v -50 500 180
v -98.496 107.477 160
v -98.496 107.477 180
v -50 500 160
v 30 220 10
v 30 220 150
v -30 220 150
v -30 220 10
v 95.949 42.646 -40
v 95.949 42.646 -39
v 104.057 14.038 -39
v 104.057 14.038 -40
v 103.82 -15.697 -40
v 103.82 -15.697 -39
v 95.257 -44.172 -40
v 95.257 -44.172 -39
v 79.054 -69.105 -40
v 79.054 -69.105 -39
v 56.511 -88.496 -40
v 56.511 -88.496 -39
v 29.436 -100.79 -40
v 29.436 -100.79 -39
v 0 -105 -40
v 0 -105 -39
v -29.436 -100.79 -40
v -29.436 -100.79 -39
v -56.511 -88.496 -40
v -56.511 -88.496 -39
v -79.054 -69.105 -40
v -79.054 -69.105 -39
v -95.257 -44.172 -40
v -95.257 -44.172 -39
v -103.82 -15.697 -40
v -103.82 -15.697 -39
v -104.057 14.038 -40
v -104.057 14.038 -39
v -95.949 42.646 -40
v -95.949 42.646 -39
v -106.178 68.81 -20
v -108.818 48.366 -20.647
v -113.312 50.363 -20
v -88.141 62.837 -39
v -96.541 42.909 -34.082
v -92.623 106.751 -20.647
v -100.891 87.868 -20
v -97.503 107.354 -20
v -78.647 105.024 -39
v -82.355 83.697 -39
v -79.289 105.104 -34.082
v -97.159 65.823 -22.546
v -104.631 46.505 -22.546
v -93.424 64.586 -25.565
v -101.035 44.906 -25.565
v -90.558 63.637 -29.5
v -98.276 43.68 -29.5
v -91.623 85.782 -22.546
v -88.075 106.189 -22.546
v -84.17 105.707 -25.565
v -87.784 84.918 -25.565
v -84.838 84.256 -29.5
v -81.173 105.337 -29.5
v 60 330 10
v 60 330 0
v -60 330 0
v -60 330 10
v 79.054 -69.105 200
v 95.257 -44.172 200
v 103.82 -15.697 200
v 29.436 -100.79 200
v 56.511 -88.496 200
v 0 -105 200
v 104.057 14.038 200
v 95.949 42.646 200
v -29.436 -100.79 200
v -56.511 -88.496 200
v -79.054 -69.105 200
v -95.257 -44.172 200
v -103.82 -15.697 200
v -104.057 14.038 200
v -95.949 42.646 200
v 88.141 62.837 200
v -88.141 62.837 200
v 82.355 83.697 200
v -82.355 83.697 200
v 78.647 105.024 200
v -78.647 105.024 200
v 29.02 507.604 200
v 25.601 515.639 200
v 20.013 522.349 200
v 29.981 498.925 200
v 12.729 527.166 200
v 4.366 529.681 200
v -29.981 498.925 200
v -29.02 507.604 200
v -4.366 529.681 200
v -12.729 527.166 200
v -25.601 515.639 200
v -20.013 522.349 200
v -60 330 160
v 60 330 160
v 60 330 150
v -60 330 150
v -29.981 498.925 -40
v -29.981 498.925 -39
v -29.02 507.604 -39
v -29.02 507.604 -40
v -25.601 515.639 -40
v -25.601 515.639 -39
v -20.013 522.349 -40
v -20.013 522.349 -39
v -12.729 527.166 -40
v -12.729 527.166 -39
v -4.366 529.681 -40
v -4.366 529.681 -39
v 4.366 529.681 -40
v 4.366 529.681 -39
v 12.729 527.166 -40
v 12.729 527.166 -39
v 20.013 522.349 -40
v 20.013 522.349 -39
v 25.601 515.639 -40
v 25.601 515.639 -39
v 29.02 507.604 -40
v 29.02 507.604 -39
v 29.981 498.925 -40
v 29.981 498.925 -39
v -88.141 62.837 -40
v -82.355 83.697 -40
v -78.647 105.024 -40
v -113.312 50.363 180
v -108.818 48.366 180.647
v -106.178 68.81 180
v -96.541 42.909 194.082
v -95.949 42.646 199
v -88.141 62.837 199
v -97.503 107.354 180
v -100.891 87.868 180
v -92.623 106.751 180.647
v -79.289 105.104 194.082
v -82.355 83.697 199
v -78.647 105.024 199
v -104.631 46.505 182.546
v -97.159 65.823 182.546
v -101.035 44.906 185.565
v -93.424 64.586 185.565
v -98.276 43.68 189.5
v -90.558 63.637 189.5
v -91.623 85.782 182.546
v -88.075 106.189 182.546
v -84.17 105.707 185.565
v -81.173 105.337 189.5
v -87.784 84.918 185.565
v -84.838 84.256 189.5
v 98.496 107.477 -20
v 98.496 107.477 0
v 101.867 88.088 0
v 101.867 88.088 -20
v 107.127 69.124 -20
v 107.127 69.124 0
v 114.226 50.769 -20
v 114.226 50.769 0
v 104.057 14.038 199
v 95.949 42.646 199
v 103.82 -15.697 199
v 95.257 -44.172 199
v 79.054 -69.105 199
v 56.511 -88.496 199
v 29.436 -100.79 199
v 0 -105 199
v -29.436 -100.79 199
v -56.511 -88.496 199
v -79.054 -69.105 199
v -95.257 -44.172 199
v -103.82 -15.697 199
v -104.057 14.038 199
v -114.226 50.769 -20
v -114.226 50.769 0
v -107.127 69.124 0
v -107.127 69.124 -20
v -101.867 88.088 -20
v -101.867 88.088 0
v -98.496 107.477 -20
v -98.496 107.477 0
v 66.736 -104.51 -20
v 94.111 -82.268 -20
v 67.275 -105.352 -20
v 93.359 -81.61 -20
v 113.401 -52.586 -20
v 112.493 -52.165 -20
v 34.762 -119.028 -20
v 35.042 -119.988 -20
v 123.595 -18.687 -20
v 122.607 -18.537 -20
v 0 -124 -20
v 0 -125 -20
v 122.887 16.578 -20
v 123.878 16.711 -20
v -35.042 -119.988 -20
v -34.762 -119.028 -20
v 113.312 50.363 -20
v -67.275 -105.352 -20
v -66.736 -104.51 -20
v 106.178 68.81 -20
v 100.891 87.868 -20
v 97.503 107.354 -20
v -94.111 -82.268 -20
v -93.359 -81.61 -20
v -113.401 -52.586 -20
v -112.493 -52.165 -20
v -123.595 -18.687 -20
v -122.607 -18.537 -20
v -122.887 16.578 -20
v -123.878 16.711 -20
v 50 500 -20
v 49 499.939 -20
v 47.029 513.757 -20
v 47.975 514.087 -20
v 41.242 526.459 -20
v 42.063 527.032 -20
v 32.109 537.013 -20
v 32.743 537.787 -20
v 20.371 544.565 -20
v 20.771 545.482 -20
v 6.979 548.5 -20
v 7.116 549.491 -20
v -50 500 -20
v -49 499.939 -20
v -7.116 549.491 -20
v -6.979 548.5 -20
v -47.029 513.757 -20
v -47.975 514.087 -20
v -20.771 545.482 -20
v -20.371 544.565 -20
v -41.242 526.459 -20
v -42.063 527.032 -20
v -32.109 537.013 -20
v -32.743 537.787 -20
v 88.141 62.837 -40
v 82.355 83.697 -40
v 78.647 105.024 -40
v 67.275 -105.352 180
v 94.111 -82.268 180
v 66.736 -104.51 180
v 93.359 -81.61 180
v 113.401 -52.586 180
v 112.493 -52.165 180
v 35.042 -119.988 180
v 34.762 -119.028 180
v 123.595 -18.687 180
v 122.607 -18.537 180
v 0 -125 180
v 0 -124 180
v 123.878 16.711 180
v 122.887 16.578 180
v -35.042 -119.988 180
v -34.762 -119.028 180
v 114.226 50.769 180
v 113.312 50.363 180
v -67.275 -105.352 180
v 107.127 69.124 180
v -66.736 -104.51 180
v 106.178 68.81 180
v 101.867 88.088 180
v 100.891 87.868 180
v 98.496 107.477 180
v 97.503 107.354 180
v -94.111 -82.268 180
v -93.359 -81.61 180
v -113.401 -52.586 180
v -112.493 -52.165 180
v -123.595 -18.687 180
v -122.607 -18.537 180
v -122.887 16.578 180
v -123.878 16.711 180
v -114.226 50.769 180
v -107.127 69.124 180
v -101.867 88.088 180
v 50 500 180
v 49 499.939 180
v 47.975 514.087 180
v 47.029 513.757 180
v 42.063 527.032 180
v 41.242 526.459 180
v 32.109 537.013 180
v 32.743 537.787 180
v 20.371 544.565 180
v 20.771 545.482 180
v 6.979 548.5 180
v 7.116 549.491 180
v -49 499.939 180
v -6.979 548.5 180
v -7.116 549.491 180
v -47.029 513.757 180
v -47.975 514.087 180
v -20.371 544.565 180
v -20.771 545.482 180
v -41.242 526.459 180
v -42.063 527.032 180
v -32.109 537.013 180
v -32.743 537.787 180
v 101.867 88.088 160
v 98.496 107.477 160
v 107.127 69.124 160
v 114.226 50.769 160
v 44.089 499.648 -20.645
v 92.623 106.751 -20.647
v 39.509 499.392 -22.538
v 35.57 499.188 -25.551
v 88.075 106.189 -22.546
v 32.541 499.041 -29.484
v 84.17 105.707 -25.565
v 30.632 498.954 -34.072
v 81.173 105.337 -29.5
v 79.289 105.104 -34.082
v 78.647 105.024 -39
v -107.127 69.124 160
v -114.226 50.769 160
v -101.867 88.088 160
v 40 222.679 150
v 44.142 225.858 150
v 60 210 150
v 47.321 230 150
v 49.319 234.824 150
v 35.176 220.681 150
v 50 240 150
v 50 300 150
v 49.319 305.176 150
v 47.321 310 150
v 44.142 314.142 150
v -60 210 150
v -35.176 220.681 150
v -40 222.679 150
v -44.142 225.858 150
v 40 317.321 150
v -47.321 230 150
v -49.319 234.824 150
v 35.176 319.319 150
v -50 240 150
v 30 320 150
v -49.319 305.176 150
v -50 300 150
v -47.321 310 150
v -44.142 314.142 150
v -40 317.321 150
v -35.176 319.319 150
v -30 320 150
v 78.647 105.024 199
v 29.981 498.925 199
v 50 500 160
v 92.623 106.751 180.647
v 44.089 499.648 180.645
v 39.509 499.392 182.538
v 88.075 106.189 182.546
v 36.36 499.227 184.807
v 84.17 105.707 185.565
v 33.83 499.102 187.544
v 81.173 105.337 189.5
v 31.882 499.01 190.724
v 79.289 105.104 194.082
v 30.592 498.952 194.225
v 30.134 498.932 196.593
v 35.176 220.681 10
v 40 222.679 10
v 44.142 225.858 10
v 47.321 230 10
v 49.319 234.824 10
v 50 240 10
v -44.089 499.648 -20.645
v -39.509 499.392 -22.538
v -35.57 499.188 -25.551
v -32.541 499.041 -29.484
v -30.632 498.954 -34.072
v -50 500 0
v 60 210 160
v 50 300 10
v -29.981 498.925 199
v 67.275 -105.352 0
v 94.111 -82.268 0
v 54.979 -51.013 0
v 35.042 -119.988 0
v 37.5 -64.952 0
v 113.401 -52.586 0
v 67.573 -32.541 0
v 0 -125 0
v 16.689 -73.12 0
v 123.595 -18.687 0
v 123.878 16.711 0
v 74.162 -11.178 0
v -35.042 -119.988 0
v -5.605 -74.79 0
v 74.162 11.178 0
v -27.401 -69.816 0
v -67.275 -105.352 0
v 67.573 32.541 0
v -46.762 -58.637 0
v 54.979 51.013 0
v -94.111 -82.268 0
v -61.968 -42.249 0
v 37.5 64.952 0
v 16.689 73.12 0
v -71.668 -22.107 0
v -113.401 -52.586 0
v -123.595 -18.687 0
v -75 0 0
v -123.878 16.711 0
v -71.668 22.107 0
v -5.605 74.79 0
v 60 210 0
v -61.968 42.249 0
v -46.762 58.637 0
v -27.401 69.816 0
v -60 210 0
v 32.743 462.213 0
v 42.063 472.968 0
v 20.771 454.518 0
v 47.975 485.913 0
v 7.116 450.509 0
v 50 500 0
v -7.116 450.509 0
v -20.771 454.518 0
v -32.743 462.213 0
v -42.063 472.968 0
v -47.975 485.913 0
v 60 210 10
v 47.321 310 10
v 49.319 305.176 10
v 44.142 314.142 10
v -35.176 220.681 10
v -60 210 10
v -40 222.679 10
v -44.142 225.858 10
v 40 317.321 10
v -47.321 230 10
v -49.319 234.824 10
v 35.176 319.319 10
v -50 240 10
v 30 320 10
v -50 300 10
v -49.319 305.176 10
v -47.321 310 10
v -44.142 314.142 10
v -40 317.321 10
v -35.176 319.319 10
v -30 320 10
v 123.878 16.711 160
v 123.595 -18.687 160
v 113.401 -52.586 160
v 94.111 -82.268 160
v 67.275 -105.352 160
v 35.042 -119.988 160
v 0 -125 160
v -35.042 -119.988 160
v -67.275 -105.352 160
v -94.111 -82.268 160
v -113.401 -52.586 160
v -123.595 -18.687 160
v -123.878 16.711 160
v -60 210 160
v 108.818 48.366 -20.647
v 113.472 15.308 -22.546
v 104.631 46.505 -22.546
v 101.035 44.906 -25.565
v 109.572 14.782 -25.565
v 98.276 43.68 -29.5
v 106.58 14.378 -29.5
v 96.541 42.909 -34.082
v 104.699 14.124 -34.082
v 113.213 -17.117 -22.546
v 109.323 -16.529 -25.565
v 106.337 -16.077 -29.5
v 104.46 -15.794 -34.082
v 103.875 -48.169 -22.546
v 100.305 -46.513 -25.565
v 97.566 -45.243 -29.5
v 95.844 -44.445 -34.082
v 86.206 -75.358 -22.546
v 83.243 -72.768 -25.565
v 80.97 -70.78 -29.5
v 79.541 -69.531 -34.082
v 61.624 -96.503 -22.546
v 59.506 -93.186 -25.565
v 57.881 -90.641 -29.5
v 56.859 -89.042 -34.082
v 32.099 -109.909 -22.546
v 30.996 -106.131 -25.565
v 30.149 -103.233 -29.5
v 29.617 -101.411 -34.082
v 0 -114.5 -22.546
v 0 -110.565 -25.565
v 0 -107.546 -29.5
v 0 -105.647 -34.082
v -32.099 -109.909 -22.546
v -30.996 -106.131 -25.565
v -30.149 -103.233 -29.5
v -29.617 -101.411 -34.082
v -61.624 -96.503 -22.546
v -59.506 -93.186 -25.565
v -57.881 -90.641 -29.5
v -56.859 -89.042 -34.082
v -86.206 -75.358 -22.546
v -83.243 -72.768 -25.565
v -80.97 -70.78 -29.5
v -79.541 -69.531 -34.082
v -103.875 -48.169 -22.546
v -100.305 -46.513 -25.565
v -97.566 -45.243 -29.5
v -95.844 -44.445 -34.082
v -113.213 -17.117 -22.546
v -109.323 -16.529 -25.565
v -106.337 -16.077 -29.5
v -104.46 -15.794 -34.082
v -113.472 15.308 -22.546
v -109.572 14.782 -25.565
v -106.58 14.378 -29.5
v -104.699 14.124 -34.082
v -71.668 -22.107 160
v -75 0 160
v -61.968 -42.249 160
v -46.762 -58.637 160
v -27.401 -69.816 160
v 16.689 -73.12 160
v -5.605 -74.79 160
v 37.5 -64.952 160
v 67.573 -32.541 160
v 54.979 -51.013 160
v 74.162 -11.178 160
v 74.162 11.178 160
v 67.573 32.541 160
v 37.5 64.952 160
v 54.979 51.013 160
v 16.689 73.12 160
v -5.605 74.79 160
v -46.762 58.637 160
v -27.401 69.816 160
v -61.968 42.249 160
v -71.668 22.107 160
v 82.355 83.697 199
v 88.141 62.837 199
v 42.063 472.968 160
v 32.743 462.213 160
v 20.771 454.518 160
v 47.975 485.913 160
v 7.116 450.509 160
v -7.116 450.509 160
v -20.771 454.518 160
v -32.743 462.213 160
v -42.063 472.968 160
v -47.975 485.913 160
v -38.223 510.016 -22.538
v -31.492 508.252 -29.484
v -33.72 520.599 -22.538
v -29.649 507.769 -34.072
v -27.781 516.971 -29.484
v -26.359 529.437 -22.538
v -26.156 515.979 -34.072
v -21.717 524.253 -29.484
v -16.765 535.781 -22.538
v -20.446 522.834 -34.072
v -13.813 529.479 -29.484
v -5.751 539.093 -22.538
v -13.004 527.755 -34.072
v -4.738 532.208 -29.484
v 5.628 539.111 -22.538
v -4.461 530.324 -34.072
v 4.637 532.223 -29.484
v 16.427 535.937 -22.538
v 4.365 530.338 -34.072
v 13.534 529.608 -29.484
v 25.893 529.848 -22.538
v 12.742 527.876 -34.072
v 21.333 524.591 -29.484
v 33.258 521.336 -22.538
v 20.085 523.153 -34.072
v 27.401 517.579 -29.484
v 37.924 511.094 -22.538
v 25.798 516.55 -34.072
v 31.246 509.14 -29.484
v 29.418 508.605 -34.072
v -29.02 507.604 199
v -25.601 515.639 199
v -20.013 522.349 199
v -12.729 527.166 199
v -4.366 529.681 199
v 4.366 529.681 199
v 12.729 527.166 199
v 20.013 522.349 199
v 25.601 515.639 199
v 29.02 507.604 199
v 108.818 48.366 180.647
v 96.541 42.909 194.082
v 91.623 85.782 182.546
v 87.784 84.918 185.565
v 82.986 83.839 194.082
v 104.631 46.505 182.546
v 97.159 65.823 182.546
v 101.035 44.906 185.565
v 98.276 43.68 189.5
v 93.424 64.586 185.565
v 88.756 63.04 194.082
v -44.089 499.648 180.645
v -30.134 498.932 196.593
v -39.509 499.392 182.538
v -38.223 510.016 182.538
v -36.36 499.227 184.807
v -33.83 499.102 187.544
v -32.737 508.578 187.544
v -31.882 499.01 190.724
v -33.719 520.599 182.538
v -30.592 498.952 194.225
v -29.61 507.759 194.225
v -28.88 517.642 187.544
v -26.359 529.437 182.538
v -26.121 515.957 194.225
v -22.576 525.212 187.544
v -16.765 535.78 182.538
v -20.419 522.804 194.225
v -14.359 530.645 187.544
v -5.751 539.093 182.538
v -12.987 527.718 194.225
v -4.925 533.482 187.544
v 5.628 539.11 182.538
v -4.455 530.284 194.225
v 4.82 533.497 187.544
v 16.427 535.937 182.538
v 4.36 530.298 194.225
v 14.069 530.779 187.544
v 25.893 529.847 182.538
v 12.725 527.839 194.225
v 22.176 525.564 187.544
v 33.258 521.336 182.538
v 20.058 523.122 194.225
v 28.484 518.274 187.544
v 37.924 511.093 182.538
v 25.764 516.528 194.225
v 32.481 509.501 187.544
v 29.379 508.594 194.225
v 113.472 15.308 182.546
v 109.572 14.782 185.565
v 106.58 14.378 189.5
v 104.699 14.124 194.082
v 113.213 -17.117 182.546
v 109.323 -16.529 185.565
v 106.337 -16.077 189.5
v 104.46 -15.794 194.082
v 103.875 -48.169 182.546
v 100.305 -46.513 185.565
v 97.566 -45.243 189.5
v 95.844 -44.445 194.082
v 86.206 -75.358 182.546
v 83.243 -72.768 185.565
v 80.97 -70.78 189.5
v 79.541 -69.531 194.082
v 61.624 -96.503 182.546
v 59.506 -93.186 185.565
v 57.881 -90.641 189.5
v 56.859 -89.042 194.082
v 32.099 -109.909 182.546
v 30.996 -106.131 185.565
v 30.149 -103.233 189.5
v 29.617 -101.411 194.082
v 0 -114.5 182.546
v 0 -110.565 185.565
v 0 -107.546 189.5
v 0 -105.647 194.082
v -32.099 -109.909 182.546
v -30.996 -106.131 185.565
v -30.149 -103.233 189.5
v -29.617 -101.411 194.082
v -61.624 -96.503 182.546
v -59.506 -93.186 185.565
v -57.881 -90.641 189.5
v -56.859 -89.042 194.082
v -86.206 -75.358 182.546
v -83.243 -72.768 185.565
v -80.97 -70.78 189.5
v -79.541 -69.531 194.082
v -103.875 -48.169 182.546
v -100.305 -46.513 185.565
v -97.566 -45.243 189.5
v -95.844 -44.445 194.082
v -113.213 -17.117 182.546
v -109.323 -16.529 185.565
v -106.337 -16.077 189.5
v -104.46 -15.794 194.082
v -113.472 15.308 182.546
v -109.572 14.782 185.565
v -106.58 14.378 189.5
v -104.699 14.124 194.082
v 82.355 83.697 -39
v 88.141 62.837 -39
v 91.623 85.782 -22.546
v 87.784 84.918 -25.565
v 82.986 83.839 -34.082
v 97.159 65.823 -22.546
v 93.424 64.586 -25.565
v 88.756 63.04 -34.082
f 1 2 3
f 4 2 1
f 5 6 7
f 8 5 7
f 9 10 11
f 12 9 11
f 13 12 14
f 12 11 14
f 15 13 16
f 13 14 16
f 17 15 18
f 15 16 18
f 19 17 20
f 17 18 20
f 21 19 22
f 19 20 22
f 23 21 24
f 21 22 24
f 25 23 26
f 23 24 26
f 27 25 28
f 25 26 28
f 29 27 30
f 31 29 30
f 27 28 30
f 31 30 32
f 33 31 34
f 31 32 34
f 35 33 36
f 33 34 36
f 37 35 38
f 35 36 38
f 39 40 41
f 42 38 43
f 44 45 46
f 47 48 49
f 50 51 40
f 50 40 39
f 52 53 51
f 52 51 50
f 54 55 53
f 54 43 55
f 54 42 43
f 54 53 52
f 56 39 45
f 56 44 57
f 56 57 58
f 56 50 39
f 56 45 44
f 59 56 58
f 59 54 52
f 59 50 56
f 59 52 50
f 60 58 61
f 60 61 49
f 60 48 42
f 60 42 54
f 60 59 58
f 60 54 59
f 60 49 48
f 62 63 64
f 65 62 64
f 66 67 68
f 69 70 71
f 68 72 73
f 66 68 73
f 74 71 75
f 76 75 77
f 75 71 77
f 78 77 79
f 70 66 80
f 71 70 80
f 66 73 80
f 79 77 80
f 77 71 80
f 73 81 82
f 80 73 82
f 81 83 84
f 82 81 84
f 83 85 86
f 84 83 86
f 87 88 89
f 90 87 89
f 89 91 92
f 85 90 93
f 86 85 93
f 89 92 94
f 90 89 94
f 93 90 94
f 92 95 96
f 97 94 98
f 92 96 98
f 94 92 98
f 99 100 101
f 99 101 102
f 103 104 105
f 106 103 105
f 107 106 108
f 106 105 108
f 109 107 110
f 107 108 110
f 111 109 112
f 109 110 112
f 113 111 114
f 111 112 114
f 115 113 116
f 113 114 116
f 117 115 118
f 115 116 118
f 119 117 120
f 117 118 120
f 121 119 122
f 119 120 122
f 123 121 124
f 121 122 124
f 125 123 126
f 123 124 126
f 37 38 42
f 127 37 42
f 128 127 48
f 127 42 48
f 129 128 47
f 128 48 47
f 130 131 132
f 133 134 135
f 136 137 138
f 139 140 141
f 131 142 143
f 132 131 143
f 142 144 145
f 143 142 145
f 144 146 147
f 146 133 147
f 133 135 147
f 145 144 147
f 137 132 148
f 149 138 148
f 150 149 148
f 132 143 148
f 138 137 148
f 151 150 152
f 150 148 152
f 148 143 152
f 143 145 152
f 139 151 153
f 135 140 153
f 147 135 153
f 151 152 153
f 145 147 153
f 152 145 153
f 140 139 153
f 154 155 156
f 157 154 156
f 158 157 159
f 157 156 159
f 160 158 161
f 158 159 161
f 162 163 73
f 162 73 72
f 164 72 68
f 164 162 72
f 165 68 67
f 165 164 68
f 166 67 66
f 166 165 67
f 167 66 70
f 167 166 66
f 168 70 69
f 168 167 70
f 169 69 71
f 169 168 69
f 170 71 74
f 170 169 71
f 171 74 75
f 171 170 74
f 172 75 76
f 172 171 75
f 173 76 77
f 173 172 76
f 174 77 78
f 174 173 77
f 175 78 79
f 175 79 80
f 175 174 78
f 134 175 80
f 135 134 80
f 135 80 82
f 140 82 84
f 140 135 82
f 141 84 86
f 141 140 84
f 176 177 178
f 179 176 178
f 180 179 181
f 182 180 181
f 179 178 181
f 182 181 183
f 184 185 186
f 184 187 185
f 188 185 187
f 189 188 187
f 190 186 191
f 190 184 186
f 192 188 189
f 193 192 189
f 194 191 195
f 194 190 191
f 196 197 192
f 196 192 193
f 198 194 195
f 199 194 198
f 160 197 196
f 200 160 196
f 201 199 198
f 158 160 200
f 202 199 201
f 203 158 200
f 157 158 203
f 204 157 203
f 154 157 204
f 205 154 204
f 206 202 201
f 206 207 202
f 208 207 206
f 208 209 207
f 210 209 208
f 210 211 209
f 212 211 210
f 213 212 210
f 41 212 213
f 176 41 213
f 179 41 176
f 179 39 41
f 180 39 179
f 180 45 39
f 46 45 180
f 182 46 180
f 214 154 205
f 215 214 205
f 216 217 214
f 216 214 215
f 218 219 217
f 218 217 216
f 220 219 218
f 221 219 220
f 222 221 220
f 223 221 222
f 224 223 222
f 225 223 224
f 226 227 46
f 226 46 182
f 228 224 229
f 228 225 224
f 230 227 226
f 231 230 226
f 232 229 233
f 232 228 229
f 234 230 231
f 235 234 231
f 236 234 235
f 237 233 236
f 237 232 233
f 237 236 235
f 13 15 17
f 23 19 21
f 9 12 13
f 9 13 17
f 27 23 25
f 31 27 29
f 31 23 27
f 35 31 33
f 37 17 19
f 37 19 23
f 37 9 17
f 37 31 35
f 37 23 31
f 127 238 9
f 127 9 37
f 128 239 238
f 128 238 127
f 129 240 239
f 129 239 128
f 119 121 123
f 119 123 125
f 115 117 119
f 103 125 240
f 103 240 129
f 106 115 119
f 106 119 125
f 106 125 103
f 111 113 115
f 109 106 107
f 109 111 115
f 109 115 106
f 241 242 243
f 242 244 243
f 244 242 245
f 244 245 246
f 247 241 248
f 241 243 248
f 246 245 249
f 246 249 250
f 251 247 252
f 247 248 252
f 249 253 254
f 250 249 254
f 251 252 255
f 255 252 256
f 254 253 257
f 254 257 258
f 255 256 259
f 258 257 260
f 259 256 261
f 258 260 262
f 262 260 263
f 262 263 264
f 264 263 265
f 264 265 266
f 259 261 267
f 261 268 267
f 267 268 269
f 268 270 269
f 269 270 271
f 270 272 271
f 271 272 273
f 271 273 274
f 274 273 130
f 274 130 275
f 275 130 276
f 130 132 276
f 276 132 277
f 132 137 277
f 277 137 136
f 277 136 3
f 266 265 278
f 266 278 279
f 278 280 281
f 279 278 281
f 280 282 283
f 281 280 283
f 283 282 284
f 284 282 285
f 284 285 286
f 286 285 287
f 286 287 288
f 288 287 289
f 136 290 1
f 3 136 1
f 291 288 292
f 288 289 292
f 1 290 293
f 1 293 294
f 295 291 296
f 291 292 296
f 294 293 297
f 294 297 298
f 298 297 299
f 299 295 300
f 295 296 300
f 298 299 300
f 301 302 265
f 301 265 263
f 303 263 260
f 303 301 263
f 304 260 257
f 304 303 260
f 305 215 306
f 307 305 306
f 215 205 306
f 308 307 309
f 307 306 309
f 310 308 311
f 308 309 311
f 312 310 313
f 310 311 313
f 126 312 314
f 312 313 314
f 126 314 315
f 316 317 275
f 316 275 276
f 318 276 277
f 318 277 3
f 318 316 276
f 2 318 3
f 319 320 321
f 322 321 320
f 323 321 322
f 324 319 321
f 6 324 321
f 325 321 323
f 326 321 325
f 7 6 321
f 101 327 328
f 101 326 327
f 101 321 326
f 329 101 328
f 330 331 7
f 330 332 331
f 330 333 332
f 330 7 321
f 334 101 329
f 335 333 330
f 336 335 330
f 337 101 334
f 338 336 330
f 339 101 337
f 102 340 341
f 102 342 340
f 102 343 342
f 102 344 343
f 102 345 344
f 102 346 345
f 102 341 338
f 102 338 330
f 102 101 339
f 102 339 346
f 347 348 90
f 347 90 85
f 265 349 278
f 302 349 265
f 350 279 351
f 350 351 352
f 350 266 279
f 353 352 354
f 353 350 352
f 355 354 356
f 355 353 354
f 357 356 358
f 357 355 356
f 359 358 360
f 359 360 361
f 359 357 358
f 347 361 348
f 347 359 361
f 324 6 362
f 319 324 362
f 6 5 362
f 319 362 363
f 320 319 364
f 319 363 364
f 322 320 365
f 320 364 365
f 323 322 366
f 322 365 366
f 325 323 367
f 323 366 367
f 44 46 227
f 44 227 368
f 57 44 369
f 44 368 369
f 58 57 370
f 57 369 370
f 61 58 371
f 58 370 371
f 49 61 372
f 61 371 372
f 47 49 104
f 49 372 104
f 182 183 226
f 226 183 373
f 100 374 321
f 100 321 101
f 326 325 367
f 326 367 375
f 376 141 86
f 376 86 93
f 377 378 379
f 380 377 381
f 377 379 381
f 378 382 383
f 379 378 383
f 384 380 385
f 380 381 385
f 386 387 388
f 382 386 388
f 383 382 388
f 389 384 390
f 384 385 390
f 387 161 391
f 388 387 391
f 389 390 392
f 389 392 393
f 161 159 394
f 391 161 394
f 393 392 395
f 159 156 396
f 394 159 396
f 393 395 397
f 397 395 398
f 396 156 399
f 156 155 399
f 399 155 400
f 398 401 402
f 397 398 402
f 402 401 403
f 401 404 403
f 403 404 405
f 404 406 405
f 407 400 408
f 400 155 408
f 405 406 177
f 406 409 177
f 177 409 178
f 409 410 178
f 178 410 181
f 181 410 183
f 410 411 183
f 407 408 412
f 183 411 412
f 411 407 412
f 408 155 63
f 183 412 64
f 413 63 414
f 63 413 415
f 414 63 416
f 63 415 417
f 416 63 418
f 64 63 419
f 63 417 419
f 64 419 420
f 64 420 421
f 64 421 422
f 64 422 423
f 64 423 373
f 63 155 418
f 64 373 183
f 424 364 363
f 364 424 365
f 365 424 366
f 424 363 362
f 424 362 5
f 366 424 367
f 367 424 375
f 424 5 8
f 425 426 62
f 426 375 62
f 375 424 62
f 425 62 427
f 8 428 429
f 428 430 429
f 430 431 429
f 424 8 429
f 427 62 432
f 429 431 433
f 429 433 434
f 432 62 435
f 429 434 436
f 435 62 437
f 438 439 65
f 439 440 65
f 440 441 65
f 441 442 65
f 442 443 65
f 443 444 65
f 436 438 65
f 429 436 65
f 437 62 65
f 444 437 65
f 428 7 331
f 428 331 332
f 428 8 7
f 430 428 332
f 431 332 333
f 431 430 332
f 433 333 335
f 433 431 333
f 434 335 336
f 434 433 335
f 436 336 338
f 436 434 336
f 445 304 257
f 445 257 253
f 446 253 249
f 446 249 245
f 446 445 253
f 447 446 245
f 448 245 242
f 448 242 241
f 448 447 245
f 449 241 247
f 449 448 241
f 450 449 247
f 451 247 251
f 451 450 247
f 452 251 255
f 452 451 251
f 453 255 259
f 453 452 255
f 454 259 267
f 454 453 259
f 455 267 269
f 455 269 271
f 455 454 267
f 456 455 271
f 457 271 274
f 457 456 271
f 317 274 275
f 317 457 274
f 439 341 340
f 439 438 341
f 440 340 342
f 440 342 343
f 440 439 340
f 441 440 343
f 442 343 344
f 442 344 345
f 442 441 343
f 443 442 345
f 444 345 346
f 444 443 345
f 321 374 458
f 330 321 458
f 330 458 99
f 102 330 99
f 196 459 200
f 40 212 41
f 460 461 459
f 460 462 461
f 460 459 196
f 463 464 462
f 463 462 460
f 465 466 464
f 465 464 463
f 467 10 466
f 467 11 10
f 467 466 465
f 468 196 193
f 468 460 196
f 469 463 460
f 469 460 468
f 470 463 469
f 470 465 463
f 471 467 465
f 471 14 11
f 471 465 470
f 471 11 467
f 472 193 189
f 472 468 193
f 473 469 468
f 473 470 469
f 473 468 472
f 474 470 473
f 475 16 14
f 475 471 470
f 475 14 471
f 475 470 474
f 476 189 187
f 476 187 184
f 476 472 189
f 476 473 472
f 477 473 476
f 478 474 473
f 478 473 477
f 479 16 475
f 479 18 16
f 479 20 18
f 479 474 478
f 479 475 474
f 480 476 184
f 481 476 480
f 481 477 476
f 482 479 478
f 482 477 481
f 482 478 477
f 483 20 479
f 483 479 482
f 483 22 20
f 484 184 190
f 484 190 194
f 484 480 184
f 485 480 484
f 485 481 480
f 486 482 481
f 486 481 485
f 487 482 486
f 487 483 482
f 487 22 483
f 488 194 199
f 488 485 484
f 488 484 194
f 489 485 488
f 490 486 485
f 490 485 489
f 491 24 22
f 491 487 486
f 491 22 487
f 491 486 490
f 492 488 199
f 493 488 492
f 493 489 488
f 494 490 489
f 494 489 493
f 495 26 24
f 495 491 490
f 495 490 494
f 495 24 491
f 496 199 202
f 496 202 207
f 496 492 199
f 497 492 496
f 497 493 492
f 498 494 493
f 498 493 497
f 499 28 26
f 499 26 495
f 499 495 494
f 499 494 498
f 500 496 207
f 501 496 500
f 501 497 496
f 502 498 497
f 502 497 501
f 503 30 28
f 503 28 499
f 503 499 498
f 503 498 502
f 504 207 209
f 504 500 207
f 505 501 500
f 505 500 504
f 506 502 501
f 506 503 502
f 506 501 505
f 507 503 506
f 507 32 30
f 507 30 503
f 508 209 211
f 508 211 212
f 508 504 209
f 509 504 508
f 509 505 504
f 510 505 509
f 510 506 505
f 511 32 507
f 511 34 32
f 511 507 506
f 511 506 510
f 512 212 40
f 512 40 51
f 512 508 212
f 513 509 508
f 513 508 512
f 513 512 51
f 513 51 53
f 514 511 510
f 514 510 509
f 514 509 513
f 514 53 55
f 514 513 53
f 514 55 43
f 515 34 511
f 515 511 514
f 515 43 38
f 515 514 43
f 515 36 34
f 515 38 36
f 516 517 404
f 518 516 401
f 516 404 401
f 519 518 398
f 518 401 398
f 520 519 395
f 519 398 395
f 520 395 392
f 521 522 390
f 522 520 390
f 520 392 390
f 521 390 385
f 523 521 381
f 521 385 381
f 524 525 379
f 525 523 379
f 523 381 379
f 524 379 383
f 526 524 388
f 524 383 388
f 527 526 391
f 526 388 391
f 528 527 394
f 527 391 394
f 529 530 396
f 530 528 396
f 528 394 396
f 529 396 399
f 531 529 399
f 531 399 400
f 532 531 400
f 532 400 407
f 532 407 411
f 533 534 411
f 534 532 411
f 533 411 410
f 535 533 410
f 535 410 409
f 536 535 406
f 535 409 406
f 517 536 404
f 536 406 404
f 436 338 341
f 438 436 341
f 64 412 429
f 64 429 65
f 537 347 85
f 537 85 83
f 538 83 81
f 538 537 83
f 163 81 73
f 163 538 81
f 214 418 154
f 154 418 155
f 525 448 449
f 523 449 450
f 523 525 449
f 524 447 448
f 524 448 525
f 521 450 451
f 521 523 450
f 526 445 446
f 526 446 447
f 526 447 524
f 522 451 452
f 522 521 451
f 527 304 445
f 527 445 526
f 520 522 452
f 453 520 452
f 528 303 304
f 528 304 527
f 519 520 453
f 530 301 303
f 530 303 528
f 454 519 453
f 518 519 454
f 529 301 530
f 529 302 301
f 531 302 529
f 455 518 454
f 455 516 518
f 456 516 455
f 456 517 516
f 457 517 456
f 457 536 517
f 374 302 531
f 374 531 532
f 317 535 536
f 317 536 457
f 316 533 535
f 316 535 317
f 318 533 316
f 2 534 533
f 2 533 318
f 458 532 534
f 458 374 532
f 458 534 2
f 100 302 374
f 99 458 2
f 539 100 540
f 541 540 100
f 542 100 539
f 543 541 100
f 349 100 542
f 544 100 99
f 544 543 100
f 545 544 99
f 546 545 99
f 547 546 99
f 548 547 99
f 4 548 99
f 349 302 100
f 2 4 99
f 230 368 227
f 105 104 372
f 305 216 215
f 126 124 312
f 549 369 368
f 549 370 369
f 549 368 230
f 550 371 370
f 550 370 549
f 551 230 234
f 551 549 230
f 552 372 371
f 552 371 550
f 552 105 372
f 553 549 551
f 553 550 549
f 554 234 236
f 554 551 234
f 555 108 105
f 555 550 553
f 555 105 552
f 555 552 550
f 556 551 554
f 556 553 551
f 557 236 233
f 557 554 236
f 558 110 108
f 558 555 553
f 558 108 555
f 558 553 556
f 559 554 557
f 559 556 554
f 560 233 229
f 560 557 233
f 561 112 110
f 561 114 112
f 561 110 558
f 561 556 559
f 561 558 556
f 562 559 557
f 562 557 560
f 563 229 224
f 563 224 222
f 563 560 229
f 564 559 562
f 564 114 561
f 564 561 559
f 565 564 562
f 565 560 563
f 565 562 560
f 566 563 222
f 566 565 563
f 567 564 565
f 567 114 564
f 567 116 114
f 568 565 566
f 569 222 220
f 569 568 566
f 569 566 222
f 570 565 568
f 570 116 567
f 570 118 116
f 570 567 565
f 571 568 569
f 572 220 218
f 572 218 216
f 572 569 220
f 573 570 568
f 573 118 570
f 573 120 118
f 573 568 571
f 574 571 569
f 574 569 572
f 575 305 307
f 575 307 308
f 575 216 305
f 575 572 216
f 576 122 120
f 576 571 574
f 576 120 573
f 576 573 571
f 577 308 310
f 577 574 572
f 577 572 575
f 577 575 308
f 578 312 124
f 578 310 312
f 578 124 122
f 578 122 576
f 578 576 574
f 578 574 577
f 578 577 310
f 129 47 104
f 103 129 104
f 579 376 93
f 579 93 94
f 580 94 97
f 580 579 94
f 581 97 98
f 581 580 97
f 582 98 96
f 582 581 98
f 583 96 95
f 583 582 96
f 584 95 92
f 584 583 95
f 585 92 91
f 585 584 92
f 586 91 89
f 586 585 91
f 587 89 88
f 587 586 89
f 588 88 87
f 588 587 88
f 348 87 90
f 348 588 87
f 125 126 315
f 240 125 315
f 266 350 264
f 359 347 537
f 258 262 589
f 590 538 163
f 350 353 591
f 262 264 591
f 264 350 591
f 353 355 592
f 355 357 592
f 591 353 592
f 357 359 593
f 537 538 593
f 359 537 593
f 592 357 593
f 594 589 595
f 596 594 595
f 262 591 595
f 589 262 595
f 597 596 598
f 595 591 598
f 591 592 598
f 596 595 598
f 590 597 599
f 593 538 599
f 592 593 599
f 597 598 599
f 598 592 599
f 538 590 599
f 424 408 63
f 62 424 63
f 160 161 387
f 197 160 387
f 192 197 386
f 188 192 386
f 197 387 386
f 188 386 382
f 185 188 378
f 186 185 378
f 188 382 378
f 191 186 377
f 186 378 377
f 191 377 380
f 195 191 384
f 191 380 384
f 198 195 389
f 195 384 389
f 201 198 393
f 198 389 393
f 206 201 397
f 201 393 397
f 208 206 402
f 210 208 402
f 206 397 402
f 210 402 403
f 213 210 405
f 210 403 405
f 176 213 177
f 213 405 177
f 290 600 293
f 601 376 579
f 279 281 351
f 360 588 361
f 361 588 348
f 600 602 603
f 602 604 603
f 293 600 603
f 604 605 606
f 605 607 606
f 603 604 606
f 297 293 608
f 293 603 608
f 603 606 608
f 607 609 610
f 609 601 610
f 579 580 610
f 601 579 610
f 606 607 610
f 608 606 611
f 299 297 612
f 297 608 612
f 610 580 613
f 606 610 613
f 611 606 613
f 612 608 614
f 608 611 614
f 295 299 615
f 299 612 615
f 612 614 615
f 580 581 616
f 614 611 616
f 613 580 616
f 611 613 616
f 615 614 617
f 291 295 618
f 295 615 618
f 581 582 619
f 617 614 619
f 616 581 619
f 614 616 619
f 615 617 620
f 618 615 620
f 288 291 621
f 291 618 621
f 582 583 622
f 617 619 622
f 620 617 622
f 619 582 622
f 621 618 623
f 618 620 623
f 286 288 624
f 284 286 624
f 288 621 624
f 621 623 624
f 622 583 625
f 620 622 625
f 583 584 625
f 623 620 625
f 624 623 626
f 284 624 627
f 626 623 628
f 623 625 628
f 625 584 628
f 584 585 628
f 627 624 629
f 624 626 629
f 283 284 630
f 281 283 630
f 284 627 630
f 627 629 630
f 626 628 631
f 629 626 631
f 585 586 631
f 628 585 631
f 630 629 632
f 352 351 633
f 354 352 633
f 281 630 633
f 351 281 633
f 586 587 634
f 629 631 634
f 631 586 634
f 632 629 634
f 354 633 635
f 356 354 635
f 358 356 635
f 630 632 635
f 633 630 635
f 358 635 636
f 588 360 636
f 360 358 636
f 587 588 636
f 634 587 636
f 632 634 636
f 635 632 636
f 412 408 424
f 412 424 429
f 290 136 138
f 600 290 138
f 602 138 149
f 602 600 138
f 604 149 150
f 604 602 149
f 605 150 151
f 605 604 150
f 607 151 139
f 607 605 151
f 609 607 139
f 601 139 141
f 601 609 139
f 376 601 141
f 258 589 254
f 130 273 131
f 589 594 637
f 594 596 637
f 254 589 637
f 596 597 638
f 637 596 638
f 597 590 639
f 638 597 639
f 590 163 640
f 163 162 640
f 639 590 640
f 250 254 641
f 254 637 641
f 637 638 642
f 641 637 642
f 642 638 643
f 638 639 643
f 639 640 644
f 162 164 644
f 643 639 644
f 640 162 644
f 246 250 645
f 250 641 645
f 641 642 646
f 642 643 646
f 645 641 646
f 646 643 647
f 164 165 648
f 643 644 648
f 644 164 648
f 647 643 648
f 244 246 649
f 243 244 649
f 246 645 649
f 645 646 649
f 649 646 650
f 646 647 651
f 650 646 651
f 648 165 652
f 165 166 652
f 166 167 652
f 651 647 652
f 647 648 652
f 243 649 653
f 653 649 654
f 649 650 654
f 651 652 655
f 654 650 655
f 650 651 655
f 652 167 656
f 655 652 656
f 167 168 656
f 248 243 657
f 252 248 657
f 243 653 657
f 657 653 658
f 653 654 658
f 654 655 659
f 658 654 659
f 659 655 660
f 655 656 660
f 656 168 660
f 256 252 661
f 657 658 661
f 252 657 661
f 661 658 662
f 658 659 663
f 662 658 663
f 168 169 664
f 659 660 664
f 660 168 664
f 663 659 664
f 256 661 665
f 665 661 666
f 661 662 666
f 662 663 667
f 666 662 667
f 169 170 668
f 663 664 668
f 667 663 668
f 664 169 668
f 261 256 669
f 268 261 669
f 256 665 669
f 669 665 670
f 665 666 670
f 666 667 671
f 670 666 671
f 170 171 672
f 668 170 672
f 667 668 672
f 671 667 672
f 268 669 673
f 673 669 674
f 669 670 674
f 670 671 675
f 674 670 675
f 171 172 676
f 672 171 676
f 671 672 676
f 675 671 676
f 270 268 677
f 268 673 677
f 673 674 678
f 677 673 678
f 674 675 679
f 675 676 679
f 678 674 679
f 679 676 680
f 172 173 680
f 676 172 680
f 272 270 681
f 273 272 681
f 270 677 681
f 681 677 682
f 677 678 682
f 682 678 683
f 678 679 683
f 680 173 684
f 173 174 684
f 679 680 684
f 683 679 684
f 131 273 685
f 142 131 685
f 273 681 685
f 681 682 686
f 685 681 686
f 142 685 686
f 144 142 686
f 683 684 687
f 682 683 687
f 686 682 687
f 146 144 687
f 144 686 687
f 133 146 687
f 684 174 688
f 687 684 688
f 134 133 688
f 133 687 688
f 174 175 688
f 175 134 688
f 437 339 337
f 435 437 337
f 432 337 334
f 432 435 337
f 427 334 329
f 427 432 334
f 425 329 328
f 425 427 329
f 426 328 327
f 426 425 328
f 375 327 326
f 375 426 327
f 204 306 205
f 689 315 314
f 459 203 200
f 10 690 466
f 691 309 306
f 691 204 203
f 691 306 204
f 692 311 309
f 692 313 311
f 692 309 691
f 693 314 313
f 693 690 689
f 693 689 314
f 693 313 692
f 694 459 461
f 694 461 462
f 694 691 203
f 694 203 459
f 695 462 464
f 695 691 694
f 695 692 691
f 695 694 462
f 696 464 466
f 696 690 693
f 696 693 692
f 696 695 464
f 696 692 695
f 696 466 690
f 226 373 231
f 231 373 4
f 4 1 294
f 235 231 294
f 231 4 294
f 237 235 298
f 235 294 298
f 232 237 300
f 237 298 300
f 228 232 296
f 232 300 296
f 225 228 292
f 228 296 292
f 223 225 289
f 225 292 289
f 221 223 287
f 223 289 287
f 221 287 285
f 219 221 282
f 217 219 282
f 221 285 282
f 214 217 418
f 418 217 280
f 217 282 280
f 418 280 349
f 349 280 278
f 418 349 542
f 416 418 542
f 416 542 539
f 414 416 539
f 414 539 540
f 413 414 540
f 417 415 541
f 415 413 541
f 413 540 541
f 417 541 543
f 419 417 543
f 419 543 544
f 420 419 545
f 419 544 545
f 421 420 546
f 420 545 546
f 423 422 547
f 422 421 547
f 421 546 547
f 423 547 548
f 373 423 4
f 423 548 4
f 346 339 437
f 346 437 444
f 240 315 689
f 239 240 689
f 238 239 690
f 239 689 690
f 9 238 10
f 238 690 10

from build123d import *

# Parameters (mm, degrees)
IZIM1_R                       = 75
Y_KSEKLIK_EKSTR_ZYON1_DEPTH   = 180
IZIM1_R_2                     = 50
Y_KSEKLIK_EKSTR_ZYON1_2_DEPTH = 180
Y_KSEKLIK_EKSTR_ZYON2_DEPTH   = 20
Y_KSEKLIK_EKSTR_ZYON3_DEPTH   = 20
RADYUS1_R                     = 19
RADYUS1_OF_AYNALAMA1_R        = 19
IZIM4_W                       = 120
IZIM4_H                       = 120
Y_KSEKLIK_EKSTR_ZYON4_DEPTH   = 10
Y_KSEKLIK_EKSTR_ZYON5_REACH   = 597.168
IZIM6_W                       = 100
IZIM6_H                       = 100
RADYUS2_R                     = 20


with BuildPart() as part:
    # Çizim1 → Yükseklik-Ekstrüzyon1 (new body)
    with BuildSketch(Plane.XY):
        with Locations(Location((0, 0, 0), (0, 0, 180))):
            Circle(IZIM1_R)
    extrude(amount=Y_KSEKLIK_EKSTR_ZYON1_DEPTH)



with BuildPart() as body_2:
    # Çizim1 → Y_kseklik-Ekstr_zyon1 2 (new body)
    with BuildSketch(Plane.XY):
        with Locations(Location((0, 500, 0), (0, 0, 180))):
            Circle(IZIM1_R_2)
    extrude(amount=Y_KSEKLIK_EKSTR_ZYON1_2_DEPTH)


with BuildPart() as part_1:
    add(part.part)

    add(body_2.part)  # Yükseklik-Ekstrüzyon2 merges body 2
    # Çizim2 → Yükseklik-Ekstrüzyon2 (add)
    with BuildSketch(Plane.XY):
        with BuildLine():
            Line((50, 500), (98.495702008, 107.476734806))
            ThreePointArc((98.495702008, 107.476734806), (104.263508371, 78.541265575), (114.225589108, 50.769230769))
            ThreePointArc((114.225589108, 50.769230769), (0, -125), (-114.225589108, 50.769230769))
            ThreePointArc((-114.225589108, 50.769230769), (-104.263508371, 78.541265575), (-98.495702008, 107.476734806))
            Line((-98.495702008, 107.476734806), (-50, 500))
            ThreePointArc((-50, 500), (0, 550), (50, 500))
        make_face()
    y_kseklik_ekstr_zyon2 = extrude(amount=-Y_KSEKLIK_EKSTR_ZYON2_DEPTH)

    # Çizim3 → Yükseklik-Ekstrüzyon3 (add)
    with BuildSketch(Plane(origin=(0, 0, -20), x_dir=(-1, 0, 0), z_dir=(0, 0, -1))):
        with BuildLine():
            Line((-29.98073719, 498.925105803), (-78.646619041, 105.024408287))
            ThreePointArc((-78.646619041, 105.024408287), (-84.99120604, 73.195392132), (-95.949494851, 42.646153846))
            ThreePointArc((-95.949494851, 42.646153846), (0, -105), (95.949494851, 42.646153846))
            ThreePointArc((95.949494851, 42.646153846), (84.99120604, 73.195392132), (78.646619041, 105.024408287))
            Line((78.646619041, 105.024408287), (29.98073719, 498.925105803))
            ThreePointArc((29.98073719, 498.925105803), (0, 530), (-29.98073719, 498.925105803))
        make_face()
    y_kseklik_ekstr_zyon3 = extrude(amount=Y_KSEKLIK_EKSTR_ZYON3_DEPTH)

    # Radyus1
    radyus1_edges = [part_1.edges().sort_by_distance(p)[0] for p in [
        (0, 530, -20),
        (54.313678116, 301.974757045, -20),
        (84.99120604, 73.195392132, -20),
        (0, -105, -20),
        (-84.99120604, 73.195392132, -20),
        (-54.313678116, 301.974757045, -20),
    ]]
    fillet(radyus1_edges, radius=RADYUS1_R)

    # Aynalama1: Yükseklik-Ekstrüzyon2, Yükseklik-Ekstrüzyon3 across plane
    add(y_kseklik_ekstr_zyon2.mirror(Plane.XY.offset(80)))
    add(y_kseklik_ekstr_zyon3.mirror(Plane.XY.offset(80)))

    # Radyus1 of Aynalama1
    radyus1_of_aynalama1_edges = [part_1.edges().sort_by_distance(p)[0] for p in [
        (0, 530, 180),
        (54.313678116, 301.974757045, 180),
        (84.99120604, 73.195392132, 180),
        (0, -105, 180),
        (-84.99120604, 73.195392132, 180),
        (-54.313678116, 301.974757045, 180),
    ]]
    fillet(radyus1_of_aynalama1_edges, radius=RADYUS1_OF_AYNALAMA1_R)

    # Çizim4 → Yükseklik-Ekstrüzyon4 (add)
    with BuildSketch(Plane(origin=(0, 0, 160), x_dir=(-1, 0, 0), z_dir=(0, 0, -1))):
        with Locations((0, 270)):
            Rectangle(IZIM4_W, IZIM4_H)
    y_kseklik_ekstr_zyon4 = extrude(amount=Y_KSEKLIK_EKSTR_ZYON4_DEPTH)

    # Aynalama2: Yükseklik-Ekstrüzyon4 across plane
    add(y_kseklik_ekstr_zyon4.mirror(Plane.XY.offset(80)))

    # Çizim6 → Yükseklik-Ekstrüzyon5 (add, up to next)
    with BuildSketch(Plane(origin=(0, 0, 150), x_dir=(-1, 0, 0), z_dir=(0, 0, -1)), mode=Mode.PRIVATE) as y_kseklik_ekstr_zyon5_sk1:
        with Locations((0, 270)):
            Rectangle(IZIM6_W, IZIM6_H)
    y_kseklik_ekstr_zyon5_tool1 = extrude(y_kseklik_ekstr_zyon5_sk1.sketch, amount=Y_KSEKLIK_EKSTR_ZYON5_REACH, mode=Mode.PRIVATE) - part_1.part
    add(y_kseklik_ekstr_zyon5_tool1.solids().sort_by_distance((0, 270, 150))[0])

    # Radyus2
    radyus2_edges = [part_1.edges().sort_by_distance(p)[0] for p in [
        (50, 320, 80),
        (-50, 320, 80),
        (50, 220, 80),
        (-50, 220, 80),
    ]]
    fillet(radyus2_edges, radius=RADYUS2_R)


solid = part_1.part
